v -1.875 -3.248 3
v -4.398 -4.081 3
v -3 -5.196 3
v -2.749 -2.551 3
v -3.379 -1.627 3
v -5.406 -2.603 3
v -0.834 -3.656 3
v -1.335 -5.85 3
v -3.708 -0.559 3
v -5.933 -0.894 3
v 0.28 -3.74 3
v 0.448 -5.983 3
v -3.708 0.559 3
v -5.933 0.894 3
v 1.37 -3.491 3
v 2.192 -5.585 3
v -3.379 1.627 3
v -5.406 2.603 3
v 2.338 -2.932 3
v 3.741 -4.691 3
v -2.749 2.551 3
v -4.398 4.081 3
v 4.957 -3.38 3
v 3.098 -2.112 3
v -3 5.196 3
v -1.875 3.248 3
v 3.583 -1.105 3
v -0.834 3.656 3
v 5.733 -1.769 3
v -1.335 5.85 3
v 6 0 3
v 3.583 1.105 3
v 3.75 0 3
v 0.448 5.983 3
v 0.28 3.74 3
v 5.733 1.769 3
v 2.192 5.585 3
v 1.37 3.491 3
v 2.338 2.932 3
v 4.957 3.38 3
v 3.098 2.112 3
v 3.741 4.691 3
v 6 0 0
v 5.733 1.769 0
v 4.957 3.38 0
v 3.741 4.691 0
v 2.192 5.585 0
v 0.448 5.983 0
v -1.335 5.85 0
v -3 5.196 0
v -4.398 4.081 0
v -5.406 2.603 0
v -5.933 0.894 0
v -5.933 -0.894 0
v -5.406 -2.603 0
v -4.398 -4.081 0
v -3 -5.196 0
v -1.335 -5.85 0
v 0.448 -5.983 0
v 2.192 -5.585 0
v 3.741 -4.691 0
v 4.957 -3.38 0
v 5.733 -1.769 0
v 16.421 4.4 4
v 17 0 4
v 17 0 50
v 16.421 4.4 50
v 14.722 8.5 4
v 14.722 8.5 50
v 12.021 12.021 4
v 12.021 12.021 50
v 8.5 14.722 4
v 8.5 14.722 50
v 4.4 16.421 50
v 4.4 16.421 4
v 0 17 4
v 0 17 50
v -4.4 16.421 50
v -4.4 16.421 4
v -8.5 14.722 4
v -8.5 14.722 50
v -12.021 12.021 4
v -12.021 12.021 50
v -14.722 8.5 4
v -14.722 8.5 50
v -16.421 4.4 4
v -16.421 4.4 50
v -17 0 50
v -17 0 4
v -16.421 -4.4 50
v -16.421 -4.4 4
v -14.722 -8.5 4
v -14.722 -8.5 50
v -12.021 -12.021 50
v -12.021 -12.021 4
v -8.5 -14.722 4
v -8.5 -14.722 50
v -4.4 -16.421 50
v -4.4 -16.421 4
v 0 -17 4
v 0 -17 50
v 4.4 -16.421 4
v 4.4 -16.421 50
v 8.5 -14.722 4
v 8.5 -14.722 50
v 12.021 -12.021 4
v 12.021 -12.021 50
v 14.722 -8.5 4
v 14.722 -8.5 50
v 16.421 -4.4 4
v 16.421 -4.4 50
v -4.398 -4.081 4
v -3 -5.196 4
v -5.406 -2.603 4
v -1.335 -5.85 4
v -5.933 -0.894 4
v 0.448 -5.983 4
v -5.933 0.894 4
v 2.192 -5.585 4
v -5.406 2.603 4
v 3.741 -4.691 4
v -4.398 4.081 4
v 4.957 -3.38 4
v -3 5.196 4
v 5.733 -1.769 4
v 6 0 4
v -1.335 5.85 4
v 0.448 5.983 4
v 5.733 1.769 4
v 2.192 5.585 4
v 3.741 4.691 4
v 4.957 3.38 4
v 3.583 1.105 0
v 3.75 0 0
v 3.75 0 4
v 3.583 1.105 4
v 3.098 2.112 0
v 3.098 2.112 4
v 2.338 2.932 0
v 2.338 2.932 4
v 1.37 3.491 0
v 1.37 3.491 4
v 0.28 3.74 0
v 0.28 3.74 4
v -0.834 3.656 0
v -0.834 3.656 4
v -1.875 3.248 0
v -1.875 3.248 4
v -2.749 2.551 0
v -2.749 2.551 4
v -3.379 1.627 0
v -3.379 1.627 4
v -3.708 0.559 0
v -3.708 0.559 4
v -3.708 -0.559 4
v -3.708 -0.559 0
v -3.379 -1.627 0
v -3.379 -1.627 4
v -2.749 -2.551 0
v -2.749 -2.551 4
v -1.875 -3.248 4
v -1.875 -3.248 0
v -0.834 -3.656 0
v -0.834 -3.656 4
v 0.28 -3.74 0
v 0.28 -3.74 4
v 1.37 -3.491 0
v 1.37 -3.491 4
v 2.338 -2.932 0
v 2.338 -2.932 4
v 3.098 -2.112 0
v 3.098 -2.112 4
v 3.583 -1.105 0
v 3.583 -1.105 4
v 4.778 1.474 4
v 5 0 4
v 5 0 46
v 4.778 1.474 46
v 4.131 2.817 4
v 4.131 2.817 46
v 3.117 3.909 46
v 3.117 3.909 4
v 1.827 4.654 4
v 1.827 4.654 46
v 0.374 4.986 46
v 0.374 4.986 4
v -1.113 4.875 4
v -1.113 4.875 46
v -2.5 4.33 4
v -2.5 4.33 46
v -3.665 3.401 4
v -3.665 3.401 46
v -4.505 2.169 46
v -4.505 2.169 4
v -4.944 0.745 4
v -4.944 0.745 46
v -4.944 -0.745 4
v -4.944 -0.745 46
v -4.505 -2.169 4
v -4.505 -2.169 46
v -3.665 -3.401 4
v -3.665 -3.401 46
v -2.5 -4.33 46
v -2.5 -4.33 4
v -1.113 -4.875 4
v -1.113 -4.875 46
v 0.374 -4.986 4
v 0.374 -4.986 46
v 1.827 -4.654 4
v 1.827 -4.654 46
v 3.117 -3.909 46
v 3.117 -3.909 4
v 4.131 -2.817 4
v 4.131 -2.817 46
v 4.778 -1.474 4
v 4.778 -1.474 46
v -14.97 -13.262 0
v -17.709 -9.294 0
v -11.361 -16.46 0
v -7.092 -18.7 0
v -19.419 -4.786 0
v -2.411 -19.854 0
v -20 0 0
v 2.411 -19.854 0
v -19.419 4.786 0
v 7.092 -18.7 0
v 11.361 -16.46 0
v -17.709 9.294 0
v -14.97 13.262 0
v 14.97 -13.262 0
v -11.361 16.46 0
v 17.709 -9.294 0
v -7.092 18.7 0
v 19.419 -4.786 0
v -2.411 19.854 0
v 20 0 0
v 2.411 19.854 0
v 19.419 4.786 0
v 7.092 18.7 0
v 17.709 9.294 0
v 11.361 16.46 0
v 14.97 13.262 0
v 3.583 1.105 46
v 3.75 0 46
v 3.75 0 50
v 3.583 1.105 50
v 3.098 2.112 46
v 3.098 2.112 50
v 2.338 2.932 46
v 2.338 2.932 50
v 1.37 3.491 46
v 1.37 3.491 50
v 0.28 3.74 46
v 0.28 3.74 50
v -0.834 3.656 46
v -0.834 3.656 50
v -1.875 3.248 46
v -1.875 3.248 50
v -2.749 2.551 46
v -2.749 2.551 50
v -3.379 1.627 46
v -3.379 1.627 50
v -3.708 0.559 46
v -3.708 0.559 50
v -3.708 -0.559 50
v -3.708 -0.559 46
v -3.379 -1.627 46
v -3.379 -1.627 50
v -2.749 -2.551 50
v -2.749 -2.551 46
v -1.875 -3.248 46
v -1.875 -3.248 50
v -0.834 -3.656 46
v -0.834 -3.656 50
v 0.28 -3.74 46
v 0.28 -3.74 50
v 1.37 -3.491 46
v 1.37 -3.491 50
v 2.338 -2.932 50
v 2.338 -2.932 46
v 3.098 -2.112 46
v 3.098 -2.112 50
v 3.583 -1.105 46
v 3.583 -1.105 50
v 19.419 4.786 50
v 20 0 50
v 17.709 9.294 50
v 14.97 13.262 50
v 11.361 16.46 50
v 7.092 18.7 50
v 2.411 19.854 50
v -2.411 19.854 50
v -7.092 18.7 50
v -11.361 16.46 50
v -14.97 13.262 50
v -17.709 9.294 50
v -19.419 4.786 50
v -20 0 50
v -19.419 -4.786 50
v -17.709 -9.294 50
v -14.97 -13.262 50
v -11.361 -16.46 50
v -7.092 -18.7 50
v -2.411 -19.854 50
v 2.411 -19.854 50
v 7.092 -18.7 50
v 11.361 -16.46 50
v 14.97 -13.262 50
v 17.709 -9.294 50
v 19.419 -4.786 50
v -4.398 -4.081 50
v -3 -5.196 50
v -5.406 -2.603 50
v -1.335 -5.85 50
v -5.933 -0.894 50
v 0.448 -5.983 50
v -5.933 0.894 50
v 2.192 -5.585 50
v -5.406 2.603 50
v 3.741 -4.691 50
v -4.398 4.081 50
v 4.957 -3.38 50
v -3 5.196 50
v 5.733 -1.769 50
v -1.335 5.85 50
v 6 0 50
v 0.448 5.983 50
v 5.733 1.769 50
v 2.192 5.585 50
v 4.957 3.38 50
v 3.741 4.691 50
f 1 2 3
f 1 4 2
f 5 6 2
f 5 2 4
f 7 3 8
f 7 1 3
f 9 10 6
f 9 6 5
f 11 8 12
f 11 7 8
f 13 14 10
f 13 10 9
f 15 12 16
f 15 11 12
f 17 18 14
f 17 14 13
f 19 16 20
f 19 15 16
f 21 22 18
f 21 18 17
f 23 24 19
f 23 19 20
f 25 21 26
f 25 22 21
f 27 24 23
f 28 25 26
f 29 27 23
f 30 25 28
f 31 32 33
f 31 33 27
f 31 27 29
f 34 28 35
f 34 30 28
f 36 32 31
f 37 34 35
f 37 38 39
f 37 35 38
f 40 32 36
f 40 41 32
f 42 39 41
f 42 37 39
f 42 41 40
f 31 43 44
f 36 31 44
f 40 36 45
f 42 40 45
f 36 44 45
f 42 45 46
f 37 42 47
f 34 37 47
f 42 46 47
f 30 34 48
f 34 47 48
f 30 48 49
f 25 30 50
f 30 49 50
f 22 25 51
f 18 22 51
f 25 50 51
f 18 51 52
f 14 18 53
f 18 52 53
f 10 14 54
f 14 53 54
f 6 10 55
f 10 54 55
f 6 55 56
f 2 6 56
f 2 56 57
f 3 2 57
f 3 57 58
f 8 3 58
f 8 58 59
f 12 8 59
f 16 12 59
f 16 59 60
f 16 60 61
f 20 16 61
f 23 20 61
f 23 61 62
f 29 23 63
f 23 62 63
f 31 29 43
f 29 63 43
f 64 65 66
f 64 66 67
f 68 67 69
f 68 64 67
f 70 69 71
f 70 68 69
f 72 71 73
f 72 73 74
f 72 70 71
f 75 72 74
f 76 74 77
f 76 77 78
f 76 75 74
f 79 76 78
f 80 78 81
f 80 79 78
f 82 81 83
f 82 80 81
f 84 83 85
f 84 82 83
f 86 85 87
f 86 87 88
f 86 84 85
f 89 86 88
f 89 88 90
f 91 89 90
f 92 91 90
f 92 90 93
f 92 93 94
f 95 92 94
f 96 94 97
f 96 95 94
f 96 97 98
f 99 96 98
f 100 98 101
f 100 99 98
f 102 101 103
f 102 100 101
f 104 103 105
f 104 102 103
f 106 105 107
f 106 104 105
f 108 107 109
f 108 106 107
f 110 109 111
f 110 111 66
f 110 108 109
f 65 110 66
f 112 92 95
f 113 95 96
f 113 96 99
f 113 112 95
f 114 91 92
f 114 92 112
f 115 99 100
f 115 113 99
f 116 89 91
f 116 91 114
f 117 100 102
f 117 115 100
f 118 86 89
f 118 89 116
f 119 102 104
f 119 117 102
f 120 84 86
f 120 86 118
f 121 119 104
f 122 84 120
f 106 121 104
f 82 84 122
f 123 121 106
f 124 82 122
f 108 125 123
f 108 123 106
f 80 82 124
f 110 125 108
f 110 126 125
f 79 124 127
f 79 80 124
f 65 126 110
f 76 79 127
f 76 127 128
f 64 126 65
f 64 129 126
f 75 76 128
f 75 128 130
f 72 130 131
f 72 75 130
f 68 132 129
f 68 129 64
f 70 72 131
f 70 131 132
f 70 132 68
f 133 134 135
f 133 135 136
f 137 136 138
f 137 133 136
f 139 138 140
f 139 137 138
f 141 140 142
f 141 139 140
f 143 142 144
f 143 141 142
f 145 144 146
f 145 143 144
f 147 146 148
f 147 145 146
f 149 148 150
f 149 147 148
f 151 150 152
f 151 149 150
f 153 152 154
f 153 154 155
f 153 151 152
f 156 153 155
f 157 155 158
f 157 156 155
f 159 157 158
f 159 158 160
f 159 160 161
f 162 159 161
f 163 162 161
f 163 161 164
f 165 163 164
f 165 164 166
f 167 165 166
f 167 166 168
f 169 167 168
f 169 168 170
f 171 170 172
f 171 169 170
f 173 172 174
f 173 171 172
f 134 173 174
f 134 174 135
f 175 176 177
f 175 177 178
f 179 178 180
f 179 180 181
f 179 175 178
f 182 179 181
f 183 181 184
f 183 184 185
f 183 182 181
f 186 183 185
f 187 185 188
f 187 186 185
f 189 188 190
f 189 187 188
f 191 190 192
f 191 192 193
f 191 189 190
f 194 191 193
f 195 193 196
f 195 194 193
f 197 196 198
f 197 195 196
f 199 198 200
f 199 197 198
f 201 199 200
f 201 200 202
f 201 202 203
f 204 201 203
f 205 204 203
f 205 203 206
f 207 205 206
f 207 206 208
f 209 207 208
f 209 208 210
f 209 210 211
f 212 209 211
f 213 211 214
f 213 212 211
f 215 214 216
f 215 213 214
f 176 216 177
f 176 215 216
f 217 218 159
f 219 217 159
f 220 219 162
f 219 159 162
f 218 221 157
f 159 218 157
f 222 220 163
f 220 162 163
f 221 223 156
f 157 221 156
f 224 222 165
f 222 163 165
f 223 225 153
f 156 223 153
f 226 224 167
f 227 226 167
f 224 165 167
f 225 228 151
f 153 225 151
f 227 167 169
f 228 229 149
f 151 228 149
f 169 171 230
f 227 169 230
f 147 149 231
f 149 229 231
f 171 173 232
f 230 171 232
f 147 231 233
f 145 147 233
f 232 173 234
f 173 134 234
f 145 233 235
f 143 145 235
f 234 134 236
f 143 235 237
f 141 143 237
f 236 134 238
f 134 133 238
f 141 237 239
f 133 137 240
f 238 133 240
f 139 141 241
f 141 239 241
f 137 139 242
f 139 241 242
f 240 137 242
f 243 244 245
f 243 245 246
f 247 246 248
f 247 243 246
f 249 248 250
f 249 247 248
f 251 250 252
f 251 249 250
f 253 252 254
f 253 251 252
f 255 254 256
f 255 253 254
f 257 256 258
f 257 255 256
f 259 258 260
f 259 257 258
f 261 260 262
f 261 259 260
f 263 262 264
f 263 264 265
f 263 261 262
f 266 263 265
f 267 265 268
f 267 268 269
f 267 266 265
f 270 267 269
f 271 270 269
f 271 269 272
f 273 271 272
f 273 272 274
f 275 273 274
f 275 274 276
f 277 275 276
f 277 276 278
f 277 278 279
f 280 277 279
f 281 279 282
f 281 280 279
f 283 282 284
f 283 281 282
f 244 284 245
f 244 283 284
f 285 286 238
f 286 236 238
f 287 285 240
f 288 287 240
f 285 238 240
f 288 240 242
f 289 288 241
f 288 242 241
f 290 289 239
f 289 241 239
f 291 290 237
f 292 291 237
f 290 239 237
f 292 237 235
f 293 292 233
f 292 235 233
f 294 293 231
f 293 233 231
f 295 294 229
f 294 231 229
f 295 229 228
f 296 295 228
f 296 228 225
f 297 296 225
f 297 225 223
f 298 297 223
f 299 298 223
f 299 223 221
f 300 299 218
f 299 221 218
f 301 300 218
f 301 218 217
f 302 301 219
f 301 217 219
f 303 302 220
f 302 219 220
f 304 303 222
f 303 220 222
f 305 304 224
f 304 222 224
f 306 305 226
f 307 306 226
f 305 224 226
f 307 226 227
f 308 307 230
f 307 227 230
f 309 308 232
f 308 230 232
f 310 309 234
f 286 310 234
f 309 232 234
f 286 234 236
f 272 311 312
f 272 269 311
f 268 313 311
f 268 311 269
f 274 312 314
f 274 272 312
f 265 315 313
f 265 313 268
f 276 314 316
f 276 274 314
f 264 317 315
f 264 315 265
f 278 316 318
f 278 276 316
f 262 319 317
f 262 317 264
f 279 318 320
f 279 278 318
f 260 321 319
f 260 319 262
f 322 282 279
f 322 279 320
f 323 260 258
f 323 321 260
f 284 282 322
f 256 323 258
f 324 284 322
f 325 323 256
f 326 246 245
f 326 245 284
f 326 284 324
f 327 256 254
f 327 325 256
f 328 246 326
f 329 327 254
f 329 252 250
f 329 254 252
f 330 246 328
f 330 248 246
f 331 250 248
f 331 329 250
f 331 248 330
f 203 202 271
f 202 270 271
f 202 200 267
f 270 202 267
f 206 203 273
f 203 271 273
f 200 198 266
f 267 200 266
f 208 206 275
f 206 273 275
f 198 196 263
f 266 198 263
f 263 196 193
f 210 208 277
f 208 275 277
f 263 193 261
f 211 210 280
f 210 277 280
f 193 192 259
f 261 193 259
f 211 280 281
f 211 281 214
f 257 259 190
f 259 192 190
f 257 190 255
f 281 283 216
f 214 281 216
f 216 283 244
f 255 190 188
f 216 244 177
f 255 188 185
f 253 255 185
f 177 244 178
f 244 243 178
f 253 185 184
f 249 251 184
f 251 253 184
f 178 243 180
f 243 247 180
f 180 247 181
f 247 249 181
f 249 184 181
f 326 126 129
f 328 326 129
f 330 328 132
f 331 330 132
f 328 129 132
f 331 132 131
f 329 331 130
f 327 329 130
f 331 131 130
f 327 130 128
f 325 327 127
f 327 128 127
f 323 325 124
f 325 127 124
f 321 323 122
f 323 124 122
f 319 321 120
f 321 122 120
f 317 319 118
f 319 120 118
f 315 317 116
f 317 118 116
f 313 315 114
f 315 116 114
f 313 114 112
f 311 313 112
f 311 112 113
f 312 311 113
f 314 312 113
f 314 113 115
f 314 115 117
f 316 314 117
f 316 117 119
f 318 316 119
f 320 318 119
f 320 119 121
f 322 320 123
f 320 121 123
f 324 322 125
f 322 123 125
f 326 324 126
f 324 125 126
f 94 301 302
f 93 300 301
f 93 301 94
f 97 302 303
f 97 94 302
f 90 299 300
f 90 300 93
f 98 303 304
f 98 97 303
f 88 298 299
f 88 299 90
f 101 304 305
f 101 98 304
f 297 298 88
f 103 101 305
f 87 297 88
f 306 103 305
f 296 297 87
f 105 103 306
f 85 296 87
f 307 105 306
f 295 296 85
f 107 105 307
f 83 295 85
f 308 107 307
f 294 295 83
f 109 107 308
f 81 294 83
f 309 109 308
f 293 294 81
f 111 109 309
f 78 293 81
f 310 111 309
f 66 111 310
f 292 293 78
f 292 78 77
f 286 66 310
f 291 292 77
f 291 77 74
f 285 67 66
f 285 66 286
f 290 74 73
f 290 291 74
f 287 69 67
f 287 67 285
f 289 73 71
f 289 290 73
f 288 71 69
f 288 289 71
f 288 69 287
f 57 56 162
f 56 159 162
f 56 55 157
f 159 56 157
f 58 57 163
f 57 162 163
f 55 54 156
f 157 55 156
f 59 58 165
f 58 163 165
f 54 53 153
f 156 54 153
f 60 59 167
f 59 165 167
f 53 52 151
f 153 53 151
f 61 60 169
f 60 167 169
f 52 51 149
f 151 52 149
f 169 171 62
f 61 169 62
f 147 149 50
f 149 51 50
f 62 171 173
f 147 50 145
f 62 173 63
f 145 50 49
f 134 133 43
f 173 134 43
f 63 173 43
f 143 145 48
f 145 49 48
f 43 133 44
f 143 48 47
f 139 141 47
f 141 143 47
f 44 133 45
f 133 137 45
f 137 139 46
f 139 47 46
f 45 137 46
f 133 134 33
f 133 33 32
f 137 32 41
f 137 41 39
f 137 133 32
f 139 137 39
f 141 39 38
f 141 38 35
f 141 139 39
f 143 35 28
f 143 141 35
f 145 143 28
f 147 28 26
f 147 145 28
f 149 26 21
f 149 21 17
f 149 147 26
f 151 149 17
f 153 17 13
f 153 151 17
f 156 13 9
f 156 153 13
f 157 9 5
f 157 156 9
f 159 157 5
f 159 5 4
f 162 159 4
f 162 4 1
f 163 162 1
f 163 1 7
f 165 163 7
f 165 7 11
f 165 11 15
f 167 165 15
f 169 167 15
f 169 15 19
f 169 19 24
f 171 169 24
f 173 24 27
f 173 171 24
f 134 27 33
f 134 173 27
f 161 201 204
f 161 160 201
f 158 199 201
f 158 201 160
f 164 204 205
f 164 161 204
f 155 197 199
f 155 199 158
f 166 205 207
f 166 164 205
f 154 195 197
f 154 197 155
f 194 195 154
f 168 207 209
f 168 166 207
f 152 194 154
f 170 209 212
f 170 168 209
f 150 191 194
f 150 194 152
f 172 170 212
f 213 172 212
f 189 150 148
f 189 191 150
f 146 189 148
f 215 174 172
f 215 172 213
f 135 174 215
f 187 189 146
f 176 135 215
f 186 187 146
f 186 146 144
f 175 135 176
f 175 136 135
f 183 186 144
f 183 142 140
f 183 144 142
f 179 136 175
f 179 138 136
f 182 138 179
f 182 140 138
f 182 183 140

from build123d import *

# Parameters (mm, degrees)
F0_R      = 6
F0_R_2    = 5
F0_R_3    = 3.75
F1_DEPTH  = 4
F2_R      = 6
F2_R_2    = 5
F3_DEPTH  = 42
F4_R      = 6
F4_R_2    = 5
F4_R_3    = 3.75
F5_DEPTH  = 4
F6_DEPTH  = 3
F7_R      = 20
F7_R_2    = 6
F8_DEPTH  = 4
F9_R      = 20
F9_R_2    = 17
F10_DEPTH = 46


with BuildPart() as f1:
    # F0 (on Top) → F1 (new body)
    with BuildSketch(Plane.XY):
        Circle(F0_R)
        Circle(F0_R_2, mode=Mode.SUBTRACT)
        Circle(F0_R_2)
        Circle(F0_R_3, mode=Mode.SUBTRACT)
    extrude(amount=F1_DEPTH)

    # F2 (on face) → F3 (join)
    with BuildSketch(Plane.XY.offset(4)):
        Circle(F2_R)
        Circle(F2_R_2, mode=Mode.SUBTRACT)
    extrude(amount=F3_DEPTH)

    # F4 (on face) → F5 (join)
    with BuildSketch(Plane.XY.offset(46)):
        Circle(F4_R)
        Circle(F4_R_2, mode=Mode.SUBTRACT)
        Circle(F4_R_2)
        Circle(F4_R_3, mode=Mode.SUBTRACT)
    extrude(amount=F5_DEPTH)

    # F7 (on Top) → F8 (join)
    with BuildSketch(Plane.XY):
        Circle(F7_R)
        Circle(F7_R_2, mode=Mode.SUBTRACT)
    extrude(amount=F8_DEPTH)

    # F9 (on face) → F10 (join)
    with BuildSketch(Plane.XY.offset(4)):
        Circle(F9_R)
        Circle(F9_R_2, mode=Mode.SUBTRACT)
    extrude(amount=F10_DEPTH)


with BuildPart() as f6:
    # F0 (on Top) → F6 (new body)
    with BuildSketch(Plane.XY):
        Circle(F0_R)
        Circle(F0_R_2, mode=Mode.SUBTRACT)
        Circle(F0_R_2)
        Circle(F0_R_3, mode=Mode.SUBTRACT)
    extrude(amount=F6_DEPTH)


solid = Compound([f1.part, f6.part])
